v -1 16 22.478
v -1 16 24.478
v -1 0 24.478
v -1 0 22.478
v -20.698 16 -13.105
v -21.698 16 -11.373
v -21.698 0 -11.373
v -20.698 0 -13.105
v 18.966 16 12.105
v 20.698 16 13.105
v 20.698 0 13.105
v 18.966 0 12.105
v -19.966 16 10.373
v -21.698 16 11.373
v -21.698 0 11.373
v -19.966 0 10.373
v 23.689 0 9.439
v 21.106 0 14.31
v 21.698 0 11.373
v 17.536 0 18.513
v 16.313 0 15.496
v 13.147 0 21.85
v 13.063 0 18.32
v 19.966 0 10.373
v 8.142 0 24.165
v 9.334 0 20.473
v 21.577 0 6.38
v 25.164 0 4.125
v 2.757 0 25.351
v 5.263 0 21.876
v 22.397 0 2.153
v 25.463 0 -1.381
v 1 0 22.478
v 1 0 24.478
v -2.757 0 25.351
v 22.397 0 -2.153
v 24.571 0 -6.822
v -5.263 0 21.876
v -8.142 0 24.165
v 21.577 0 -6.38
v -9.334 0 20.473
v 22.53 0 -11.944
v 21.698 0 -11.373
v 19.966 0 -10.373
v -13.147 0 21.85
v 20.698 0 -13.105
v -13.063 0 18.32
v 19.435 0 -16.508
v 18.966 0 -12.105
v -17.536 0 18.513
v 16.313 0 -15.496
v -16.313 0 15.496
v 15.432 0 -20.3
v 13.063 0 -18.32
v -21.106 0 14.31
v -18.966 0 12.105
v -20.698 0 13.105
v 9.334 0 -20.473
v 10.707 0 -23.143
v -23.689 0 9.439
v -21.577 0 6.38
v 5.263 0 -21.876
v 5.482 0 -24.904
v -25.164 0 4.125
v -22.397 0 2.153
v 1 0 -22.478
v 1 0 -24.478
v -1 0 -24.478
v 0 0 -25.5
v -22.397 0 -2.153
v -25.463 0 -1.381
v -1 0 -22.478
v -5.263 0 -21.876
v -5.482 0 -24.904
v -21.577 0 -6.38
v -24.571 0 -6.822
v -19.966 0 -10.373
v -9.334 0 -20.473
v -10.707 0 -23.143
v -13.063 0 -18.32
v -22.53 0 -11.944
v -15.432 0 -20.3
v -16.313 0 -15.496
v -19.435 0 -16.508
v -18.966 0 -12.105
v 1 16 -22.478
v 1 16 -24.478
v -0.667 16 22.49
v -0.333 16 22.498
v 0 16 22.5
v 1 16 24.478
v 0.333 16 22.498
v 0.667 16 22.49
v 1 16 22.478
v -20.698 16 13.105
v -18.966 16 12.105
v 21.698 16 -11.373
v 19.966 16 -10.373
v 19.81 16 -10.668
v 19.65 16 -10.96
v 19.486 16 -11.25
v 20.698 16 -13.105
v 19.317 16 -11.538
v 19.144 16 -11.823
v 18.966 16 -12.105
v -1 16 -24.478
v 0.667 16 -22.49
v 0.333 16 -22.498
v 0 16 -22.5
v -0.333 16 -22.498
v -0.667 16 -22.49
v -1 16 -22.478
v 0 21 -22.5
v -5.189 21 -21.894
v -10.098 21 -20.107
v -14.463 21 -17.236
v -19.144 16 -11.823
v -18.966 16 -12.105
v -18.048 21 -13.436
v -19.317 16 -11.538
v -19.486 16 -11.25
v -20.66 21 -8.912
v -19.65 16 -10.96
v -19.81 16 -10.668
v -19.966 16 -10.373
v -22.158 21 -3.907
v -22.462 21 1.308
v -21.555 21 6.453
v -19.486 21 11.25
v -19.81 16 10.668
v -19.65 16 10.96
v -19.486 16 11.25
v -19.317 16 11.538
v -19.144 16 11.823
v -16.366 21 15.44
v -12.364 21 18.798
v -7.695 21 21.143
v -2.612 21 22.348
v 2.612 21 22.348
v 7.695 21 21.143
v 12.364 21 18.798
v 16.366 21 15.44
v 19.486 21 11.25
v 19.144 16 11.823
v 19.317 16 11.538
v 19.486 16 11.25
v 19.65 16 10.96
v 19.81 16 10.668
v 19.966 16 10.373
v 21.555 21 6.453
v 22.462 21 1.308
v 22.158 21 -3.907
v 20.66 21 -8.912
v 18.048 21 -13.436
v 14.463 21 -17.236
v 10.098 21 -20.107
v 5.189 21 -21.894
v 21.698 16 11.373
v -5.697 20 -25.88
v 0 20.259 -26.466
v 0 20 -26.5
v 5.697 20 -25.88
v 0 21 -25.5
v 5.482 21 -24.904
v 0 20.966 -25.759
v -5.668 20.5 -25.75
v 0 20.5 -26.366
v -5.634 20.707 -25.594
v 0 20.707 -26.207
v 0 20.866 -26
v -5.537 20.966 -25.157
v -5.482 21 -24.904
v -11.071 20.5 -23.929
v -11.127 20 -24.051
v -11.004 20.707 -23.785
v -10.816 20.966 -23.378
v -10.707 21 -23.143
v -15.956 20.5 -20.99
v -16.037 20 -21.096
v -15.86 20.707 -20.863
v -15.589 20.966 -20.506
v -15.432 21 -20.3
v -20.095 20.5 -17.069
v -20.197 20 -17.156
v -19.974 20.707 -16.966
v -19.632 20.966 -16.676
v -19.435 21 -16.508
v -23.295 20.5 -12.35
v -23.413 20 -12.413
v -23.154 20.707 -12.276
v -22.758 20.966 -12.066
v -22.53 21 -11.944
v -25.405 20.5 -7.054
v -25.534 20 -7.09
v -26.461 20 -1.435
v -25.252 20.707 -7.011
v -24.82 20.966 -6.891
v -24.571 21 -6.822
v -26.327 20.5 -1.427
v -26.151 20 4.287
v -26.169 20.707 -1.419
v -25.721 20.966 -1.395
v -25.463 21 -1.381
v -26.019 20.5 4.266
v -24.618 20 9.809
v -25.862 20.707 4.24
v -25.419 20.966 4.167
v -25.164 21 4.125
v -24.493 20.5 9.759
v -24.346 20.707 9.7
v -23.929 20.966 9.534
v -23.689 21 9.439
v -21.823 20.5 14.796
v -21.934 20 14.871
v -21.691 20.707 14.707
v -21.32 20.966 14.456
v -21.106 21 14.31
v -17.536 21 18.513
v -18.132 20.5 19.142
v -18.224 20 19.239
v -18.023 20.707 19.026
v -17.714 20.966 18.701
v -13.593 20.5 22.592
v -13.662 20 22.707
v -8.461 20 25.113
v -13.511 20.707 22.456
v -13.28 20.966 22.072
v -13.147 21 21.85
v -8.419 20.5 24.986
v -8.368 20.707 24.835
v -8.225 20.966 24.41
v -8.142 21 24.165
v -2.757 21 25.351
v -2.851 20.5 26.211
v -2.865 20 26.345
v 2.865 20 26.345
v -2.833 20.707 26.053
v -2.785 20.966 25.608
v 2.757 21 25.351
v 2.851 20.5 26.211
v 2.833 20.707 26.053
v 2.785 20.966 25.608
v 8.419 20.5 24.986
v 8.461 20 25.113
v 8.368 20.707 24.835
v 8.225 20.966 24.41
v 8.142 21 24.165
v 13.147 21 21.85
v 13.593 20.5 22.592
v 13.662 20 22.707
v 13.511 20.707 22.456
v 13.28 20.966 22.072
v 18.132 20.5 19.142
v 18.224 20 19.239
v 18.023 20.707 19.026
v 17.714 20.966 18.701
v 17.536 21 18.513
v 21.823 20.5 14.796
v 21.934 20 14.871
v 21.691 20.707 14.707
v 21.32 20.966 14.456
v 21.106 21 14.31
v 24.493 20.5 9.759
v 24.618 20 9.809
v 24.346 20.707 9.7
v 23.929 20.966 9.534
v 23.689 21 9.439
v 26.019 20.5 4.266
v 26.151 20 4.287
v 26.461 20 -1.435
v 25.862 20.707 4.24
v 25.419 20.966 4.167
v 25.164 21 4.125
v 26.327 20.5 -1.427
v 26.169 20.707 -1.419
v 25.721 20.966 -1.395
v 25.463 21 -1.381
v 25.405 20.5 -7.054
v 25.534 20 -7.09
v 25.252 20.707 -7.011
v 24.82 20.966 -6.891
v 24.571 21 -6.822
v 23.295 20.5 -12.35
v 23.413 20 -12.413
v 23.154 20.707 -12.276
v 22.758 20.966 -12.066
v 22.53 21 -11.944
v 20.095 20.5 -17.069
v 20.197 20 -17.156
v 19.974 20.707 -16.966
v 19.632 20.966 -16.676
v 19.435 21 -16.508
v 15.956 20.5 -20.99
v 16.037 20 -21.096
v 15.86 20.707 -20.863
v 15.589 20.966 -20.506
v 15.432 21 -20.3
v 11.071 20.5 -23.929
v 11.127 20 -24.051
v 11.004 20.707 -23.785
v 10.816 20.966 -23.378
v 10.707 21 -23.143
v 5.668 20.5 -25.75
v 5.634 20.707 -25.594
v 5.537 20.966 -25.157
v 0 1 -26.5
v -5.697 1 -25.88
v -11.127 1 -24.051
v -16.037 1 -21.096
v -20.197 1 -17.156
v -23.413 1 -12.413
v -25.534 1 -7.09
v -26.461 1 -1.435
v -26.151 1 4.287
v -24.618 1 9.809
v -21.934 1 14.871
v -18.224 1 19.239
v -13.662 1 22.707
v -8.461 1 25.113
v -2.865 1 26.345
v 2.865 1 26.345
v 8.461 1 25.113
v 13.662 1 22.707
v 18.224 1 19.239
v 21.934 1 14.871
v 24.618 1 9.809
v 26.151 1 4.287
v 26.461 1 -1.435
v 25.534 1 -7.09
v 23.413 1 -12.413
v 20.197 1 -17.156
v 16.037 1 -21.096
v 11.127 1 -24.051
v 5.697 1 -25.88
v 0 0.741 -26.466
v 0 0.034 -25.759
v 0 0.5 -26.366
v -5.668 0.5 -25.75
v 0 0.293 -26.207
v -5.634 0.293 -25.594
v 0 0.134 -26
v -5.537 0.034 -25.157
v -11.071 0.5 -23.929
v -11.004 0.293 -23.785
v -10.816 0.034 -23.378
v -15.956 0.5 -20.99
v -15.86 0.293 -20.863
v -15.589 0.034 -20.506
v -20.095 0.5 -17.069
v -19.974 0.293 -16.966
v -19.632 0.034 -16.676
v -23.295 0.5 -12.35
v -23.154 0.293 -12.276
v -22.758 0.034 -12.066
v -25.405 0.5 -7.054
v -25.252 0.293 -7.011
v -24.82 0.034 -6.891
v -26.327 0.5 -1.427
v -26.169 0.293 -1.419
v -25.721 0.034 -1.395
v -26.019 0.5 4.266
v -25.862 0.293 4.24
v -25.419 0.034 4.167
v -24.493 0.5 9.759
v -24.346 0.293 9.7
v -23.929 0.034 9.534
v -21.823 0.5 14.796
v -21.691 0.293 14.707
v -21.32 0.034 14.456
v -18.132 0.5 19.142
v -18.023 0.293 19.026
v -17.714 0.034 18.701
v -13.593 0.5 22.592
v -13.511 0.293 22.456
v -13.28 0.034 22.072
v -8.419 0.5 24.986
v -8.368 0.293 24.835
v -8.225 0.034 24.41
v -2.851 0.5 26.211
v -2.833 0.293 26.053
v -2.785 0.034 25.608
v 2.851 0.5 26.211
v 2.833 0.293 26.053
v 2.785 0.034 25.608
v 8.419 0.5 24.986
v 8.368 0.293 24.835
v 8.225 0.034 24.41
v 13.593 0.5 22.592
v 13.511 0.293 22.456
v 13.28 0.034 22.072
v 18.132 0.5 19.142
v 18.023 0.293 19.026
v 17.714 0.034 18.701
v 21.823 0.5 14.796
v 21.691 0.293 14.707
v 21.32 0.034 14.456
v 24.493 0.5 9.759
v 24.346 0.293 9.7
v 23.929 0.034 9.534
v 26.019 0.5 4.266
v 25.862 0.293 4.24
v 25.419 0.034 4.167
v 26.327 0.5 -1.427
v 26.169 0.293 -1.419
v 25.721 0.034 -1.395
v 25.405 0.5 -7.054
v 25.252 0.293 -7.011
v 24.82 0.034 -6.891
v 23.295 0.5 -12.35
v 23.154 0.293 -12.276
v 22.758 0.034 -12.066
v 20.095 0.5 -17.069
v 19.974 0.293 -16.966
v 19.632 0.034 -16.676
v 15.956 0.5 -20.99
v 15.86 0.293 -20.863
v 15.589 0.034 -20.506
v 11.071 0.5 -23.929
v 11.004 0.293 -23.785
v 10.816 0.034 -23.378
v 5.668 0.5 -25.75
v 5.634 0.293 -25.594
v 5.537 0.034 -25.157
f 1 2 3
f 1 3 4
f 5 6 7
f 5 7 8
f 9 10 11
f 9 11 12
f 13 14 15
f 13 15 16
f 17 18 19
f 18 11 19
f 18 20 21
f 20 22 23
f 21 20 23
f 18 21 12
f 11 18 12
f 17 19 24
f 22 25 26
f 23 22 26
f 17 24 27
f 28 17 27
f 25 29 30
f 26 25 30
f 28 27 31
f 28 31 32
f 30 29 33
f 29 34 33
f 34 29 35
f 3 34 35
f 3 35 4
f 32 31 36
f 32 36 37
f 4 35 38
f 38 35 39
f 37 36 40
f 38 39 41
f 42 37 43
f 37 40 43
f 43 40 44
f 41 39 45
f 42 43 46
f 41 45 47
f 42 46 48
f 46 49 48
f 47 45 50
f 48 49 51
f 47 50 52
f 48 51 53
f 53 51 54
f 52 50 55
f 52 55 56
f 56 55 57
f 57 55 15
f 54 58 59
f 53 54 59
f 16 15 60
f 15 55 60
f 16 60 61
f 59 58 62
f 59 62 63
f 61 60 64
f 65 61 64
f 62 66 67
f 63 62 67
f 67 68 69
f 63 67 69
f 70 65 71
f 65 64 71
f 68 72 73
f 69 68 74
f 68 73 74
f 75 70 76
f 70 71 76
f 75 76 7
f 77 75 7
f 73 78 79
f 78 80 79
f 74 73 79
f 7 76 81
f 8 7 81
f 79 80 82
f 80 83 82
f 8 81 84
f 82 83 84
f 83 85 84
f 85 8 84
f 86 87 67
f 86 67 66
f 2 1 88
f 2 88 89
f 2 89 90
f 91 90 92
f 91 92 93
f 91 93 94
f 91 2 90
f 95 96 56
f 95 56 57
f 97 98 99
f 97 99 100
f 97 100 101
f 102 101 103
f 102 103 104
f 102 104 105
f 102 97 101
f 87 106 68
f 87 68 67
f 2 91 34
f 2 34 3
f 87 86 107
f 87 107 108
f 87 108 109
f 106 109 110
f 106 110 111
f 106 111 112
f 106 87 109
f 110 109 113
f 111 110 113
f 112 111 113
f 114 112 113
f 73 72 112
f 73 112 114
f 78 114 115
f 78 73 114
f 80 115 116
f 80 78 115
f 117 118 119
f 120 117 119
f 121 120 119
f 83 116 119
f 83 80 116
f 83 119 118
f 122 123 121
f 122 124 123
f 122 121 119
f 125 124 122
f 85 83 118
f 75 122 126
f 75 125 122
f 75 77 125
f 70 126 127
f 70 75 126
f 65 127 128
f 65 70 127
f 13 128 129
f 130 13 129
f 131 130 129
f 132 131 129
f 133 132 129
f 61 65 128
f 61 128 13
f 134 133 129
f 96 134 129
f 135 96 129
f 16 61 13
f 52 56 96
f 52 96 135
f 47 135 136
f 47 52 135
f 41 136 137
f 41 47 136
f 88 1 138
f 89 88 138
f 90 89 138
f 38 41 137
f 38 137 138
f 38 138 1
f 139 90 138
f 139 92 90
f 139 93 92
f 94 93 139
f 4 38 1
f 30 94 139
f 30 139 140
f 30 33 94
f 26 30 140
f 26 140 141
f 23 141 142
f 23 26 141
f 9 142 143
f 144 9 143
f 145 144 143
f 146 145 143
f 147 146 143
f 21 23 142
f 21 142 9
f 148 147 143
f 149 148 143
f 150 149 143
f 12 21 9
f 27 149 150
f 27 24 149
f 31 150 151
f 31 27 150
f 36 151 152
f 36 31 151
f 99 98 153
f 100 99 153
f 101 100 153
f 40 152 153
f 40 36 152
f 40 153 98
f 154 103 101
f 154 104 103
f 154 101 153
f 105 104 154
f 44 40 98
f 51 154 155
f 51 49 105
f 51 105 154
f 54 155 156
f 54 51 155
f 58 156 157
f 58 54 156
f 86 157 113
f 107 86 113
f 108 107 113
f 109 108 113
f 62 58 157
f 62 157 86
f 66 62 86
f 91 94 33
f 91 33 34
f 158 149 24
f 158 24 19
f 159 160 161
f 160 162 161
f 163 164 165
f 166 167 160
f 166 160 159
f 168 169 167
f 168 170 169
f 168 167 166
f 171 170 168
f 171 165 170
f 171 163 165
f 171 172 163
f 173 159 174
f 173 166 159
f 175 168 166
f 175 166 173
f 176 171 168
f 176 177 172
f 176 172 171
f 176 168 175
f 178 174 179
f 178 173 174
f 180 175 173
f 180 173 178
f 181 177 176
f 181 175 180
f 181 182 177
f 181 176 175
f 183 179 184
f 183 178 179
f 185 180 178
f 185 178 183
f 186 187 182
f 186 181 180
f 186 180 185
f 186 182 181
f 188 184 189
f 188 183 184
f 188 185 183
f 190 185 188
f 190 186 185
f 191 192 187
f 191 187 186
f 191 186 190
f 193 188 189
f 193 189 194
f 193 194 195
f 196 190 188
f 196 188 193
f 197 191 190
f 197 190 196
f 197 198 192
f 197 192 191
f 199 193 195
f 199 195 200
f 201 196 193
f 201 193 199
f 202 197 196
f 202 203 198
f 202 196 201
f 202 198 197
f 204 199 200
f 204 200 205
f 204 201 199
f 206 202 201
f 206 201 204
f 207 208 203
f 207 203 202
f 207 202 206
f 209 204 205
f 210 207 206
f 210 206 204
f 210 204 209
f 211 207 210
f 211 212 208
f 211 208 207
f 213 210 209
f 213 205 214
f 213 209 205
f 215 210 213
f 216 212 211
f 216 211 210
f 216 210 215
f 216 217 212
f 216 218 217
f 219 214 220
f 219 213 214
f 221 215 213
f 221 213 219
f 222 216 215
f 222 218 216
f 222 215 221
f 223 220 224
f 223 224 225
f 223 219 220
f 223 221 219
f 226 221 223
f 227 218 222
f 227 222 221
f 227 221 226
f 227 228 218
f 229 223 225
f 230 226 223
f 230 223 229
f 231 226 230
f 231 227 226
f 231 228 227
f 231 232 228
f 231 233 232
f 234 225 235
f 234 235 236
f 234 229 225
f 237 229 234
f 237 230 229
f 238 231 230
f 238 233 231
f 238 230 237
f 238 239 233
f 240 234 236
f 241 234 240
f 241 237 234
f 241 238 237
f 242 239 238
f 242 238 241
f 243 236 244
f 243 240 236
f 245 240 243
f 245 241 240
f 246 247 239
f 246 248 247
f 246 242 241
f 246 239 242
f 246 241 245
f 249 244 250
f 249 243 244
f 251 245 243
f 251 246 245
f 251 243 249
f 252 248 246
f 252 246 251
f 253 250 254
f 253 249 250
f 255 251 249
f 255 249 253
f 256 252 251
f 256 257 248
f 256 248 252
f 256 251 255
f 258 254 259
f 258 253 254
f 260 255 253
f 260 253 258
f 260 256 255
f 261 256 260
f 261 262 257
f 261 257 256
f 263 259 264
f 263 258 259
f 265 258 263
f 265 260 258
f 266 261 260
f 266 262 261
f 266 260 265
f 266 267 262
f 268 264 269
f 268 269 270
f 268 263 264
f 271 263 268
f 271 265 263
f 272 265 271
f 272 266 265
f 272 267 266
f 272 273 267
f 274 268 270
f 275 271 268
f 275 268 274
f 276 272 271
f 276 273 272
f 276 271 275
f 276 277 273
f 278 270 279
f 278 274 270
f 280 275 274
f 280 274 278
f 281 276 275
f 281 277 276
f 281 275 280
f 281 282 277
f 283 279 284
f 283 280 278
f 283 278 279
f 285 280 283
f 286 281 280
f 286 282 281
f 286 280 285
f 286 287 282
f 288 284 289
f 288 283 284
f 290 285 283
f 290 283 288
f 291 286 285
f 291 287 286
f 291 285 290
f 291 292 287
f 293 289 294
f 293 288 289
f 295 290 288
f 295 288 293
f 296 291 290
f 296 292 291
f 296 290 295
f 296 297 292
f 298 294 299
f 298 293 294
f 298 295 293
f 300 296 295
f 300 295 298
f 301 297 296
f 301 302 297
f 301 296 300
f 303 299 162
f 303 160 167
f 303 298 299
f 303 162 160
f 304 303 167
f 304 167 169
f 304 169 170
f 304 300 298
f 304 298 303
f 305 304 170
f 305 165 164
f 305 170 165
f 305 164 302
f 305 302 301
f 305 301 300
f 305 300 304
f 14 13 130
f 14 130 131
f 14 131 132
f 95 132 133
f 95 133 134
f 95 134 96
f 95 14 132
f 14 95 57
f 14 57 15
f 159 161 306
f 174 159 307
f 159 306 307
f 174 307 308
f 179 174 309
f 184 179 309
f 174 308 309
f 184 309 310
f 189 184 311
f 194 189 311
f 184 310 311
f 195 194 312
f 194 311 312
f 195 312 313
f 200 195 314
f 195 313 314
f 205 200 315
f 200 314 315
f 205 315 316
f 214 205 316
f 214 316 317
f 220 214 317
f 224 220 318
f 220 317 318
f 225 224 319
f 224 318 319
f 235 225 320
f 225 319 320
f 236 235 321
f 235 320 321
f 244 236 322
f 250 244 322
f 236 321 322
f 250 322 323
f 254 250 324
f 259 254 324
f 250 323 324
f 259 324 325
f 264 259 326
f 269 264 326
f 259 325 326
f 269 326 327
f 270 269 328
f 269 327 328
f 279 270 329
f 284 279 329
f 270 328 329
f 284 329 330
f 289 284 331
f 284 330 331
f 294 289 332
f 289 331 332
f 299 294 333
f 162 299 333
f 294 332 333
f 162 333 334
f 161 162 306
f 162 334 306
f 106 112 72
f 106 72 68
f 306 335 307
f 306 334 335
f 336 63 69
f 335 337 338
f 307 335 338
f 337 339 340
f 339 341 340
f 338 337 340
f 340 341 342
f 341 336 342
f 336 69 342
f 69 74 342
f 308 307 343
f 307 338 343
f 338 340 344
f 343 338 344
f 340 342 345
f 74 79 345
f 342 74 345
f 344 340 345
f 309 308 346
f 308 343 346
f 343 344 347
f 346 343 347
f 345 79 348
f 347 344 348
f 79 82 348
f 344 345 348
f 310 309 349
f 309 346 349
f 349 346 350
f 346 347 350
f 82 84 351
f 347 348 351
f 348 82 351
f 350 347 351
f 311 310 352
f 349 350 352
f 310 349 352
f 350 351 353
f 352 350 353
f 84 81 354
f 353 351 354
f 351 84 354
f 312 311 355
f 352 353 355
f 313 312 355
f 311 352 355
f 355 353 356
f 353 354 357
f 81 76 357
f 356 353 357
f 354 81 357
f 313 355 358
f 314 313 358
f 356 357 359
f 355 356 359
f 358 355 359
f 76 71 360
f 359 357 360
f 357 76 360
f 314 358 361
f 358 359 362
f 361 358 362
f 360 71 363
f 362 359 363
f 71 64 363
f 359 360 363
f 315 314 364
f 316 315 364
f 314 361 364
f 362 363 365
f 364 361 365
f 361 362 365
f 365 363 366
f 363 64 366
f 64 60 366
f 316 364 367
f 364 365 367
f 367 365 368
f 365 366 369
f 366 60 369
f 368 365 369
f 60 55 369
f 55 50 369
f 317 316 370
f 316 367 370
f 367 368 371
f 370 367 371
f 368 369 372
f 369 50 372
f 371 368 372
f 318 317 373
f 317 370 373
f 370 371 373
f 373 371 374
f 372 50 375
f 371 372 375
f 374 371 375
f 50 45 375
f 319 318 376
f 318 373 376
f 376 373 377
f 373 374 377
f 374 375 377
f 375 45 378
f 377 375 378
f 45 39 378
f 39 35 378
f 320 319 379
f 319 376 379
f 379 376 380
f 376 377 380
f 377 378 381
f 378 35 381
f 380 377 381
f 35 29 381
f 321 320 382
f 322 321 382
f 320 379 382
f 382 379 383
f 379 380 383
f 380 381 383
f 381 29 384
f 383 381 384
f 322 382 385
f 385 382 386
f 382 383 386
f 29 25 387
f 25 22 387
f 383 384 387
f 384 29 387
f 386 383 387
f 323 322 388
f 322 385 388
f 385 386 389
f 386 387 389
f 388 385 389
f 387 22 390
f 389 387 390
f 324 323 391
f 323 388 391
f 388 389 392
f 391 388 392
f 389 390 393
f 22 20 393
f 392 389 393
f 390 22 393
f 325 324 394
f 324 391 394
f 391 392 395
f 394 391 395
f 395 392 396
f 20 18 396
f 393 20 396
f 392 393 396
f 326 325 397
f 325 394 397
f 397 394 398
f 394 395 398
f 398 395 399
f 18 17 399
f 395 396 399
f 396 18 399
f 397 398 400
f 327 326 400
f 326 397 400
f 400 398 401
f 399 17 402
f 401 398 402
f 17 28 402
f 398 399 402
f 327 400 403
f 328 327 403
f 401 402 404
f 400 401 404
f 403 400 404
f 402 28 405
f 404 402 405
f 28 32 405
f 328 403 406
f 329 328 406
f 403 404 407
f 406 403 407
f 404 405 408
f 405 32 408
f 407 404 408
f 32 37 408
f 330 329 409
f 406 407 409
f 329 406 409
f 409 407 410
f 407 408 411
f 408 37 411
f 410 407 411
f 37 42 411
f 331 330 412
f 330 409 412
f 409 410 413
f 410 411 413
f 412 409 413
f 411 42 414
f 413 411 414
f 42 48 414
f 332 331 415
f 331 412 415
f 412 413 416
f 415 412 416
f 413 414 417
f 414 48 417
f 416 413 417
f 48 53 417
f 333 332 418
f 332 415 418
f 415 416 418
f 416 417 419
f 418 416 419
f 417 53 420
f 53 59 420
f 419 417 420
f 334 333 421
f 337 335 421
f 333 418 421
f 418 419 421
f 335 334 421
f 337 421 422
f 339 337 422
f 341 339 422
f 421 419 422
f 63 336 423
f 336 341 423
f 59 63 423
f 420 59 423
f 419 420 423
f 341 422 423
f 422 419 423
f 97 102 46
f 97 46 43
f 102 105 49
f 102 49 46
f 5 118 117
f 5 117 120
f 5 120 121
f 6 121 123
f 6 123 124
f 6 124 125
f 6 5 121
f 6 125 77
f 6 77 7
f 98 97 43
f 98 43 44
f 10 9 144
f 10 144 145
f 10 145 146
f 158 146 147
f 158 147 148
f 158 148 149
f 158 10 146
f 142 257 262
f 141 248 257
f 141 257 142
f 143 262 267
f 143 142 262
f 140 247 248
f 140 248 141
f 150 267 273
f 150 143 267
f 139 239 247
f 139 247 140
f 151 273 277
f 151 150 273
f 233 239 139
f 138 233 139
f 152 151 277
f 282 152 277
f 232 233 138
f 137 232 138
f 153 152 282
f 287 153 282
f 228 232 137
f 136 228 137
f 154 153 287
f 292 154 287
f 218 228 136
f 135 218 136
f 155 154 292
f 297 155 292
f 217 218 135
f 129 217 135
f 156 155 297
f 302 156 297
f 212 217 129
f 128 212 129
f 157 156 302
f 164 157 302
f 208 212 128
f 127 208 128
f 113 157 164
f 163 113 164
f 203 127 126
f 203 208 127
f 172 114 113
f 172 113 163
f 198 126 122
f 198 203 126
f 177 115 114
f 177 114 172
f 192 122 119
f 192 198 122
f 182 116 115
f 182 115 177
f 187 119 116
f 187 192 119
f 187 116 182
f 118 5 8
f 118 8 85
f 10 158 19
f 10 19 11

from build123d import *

# Parameters (mm, degrees)
SKETCH_1_R               = 26.5
SKETCH_1_R_2             = 22.5
EXTRUDE_1_DEPTH          = 21
CUT_EXTRUDE_1_DEPTH      = 16
PATTERN_CIRCULAR_1_COUNT = 6
FILLET_1_R               = 1


with BuildPart() as part:
    # 草图1 → 凸台-拉伸1 (new body)
    with BuildSketch(Plane(origin=(0, 0, 0), x_dir=(1, 0, 0), z_dir=(0, 1, 0))):
        with Locations(Location((0, 0, 0), (0, 0, 90))):
            Circle(SKETCH_1_R)
        with Locations(Location((0, 0, 0), (0, 0, 90))):
            Circle(SKETCH_1_R_2, mode=Mode.SUBTRACT)
    extrude(amount=EXTRUDE_1_DEPTH)

    # 草图2 → 切除-拉伸1 (cut)
    with BuildSketch(Plane.XZ):
        with BuildLine():
            ThreePointArc((-1, 22.477766793), (-0.500123564, 22.494441012), (0, 22.5))
            Line((0, 22.5), (0, 24.477766793))
            Line((0, 24.477766793), (-1, 24.477766793))
            Line((-1, 24.477766793), (-1, 22.477766793))
        make_face()
        with BuildLine():
            Line((0, 24.477766793), (0, 22.5))
            ThreePointArc((0, 22.5), (0.500123564, 22.494441012), (1, 22.477766793))
            Line((1, 22.477766793), (1, 24.477766793))
            Line((1, 24.477766793), (0, 24.477766793))
        make_face()
    cut_extrude_1 = extrude(amount=-CUT_EXTRUDE_1_DEPTH, mode=Mode.SUBTRACT)

    # 阵列(圆周)1: 切除-拉伸1 ×6 about axis
    pattern_circular_1_axis = Axis((0, 0, 0), (0, 1, 0))
    for i in range(1, PATTERN_CIRCULAR_1_COUNT):
        add(cut_extrude_1.rotate(pattern_circular_1_axis, i * 360 / PATTERN_CIRCULAR_1_COUNT), mode=Mode.SUBTRACT)

    # 圆角1
    fillet_1_edges = [part.edges().sort_by_distance(p)[0] for p in [
        (0, 0, 26.5),
        (0, 21, 26.5),
    ]]
    fillet(fillet_1_edges, radius=FILLET_1_R)


solid = part.part
